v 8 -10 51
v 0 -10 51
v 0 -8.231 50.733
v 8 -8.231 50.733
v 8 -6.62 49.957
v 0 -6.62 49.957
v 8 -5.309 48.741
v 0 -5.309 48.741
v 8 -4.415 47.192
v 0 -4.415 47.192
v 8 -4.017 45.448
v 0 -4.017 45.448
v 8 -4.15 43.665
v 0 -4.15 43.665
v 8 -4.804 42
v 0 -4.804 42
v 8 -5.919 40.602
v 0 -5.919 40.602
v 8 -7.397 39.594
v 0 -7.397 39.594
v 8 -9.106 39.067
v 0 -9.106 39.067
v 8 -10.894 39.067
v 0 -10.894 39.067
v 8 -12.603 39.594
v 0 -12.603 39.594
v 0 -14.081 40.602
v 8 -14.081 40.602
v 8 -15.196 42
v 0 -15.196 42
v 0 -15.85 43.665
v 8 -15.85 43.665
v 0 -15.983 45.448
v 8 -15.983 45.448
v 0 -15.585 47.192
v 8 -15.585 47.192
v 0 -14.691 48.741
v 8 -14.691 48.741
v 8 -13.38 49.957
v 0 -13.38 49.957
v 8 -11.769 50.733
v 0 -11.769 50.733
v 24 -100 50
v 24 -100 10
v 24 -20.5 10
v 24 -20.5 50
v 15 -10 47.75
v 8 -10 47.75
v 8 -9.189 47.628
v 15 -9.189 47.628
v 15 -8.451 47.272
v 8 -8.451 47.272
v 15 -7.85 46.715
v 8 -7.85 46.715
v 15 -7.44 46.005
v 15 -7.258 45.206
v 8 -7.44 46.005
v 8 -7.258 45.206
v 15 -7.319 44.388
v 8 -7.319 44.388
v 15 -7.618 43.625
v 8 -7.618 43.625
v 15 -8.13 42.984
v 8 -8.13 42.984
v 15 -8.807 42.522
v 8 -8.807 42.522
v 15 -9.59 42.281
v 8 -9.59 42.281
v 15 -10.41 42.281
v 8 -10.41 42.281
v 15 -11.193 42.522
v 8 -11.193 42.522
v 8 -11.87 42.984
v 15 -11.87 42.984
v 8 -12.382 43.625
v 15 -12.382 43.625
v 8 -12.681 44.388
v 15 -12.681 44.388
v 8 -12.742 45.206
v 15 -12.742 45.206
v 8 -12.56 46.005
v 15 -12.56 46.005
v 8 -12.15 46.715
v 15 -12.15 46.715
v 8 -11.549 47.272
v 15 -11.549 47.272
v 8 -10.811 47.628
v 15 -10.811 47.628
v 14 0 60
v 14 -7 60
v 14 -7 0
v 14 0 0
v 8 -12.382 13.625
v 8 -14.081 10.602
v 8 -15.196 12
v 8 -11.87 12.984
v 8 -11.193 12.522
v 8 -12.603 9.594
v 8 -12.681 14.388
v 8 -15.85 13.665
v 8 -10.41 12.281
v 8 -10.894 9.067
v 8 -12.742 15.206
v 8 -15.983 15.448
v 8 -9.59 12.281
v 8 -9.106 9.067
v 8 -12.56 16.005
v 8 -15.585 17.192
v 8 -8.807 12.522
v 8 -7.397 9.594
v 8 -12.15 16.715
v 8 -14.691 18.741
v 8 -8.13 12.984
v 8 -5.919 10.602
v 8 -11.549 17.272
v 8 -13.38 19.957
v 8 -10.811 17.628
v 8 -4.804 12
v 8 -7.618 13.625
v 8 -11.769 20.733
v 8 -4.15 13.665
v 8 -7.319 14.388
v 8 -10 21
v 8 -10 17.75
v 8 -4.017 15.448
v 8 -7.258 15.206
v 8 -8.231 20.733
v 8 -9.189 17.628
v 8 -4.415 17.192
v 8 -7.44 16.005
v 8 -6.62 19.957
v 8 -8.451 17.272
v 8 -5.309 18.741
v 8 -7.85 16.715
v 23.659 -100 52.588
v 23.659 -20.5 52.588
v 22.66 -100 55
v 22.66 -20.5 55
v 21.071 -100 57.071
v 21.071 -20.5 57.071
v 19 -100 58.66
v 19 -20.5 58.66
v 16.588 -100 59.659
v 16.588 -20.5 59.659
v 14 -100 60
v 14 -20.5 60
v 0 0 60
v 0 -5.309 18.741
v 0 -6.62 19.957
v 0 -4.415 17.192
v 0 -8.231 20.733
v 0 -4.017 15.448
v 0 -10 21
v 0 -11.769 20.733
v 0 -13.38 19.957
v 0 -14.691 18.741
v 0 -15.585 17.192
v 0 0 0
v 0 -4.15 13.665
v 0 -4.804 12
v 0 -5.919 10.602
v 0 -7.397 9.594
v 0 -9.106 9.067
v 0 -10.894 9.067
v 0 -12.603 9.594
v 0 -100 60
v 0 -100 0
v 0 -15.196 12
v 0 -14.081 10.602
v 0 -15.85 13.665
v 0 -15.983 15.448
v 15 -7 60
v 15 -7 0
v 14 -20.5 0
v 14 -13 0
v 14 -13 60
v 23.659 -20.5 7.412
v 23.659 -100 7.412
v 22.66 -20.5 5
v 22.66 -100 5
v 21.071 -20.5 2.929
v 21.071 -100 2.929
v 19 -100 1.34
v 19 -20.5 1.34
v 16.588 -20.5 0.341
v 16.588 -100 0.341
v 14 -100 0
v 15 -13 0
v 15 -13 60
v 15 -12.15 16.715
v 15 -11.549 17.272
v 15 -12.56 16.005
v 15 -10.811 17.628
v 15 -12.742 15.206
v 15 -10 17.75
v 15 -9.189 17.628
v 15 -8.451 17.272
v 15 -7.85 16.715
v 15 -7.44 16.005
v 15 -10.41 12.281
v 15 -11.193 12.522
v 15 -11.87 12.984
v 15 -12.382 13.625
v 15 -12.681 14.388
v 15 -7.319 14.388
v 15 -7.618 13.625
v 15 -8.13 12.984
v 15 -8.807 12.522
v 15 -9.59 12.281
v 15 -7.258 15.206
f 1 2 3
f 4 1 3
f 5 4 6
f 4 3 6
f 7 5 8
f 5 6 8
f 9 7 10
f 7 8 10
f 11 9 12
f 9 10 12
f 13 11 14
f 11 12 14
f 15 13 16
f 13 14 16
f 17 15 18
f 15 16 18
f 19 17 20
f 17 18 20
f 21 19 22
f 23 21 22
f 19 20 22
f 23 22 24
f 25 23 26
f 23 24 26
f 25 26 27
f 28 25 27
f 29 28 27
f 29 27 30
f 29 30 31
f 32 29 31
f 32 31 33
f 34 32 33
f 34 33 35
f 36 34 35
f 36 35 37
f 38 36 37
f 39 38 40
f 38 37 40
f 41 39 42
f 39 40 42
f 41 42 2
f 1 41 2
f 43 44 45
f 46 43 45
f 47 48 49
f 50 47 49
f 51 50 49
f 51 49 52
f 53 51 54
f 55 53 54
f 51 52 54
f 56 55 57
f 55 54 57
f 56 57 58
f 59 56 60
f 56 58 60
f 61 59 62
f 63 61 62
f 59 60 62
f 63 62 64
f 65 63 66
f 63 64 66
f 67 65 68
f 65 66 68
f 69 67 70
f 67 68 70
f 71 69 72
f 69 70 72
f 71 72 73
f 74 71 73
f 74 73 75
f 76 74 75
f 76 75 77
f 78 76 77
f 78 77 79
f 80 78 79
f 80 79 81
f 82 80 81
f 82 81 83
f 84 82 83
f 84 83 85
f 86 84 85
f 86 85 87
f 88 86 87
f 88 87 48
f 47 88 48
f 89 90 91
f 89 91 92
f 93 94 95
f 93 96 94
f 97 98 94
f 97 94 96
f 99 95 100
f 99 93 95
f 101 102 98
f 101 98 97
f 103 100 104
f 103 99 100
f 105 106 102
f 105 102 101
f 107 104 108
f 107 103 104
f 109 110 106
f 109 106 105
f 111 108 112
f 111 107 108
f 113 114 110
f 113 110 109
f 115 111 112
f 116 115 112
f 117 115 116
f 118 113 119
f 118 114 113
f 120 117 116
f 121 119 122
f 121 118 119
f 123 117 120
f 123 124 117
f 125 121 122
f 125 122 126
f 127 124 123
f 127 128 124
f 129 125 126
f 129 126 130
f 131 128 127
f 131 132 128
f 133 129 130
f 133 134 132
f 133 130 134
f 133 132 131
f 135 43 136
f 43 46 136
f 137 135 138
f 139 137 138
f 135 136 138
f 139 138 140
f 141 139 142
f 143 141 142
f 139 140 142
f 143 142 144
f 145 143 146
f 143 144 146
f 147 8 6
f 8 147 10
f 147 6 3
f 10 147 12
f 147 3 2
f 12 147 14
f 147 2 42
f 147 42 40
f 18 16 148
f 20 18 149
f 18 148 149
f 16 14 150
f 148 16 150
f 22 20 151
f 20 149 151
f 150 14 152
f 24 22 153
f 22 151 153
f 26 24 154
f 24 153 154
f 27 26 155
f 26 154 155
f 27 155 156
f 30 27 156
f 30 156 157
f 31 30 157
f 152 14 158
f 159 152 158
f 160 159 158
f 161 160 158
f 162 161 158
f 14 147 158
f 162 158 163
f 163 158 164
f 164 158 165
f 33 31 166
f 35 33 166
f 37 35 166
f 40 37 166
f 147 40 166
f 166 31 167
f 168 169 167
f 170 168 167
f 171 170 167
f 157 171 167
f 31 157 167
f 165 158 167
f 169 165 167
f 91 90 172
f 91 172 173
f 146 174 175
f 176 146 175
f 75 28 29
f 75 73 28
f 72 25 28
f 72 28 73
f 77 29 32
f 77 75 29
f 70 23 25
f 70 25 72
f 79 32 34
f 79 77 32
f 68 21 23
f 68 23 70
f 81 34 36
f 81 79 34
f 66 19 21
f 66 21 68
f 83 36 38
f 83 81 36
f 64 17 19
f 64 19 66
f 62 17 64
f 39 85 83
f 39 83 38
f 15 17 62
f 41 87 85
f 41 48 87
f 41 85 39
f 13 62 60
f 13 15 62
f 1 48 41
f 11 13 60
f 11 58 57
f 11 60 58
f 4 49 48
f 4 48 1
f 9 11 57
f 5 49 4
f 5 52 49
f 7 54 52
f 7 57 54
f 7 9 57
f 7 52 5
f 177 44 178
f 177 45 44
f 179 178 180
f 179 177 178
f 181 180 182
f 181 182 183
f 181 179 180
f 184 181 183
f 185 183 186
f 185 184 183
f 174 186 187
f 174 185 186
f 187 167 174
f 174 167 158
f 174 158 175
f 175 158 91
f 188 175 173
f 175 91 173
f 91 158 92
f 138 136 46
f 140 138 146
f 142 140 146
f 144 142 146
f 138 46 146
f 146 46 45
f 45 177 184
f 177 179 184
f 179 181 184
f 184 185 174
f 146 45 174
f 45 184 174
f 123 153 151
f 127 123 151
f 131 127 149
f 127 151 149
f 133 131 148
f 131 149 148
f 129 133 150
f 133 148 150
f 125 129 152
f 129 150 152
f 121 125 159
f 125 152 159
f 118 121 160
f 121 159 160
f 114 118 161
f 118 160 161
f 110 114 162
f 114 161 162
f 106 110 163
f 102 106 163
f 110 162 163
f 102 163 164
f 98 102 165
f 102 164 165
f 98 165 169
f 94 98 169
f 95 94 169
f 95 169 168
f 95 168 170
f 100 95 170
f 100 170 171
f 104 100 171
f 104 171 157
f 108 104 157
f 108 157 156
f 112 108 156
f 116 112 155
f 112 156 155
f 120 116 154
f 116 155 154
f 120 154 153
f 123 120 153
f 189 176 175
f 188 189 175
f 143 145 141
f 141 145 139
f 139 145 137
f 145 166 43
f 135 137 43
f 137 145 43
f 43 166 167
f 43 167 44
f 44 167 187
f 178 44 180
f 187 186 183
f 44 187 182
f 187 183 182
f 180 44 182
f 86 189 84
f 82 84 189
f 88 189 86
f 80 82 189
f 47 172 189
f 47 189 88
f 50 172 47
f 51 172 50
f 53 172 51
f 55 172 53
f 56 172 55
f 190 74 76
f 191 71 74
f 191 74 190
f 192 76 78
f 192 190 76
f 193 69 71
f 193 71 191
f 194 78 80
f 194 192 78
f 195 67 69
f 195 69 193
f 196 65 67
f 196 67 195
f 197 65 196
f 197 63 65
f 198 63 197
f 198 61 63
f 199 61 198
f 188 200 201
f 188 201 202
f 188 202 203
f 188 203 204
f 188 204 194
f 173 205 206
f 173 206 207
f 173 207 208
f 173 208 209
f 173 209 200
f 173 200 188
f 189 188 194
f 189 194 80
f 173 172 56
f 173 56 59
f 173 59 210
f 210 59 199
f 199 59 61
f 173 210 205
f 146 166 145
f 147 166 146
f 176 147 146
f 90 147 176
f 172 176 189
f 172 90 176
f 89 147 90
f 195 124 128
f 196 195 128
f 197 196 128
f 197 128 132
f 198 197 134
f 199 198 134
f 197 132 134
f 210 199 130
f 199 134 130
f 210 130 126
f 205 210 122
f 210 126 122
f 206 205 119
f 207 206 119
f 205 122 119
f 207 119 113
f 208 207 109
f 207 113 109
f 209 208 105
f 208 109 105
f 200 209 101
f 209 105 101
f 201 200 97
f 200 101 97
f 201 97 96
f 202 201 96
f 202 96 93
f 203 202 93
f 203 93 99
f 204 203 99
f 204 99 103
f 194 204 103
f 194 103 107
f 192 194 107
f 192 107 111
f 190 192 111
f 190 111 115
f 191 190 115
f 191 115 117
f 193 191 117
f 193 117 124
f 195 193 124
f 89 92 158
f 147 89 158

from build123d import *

# Parameters (mm, degrees)
SALIENTE_EXTRUIR1_DEPTH = 60
CROQUIS4_W              = 60
CROQUIS4_H              = 6
SALIENTE_EXTRUIR3_DEPTH = 1
CROQUIS5_R              = 2.75
CORTAR_EXTRUIR1_DEPTH   = 25
CROQUIS6_R              = 6
CORTAR_EXTRUIR2_DEPTH   = 8
REDONDEO1_R             = 10


with BuildPart() as part:
    # Croquis1 → Saliente-Extruir1 (new body)
    with BuildSketch(Plane.XY):
        Polygon((24, -100), (24, -20.5), (14, -20.5), (14, 0), (0, 0), (0, -100), align=None)
    extrude(amount=SALIENTE_EXTRUIR1_DEPTH)

    # Croquis4 → Saliente-Extruir3 (add)
    with BuildSketch(Plane(origin=(14, 0, 0), x_dir=(0, 0, -1), z_dir=(1, 0, 0))):
        with Locations((-30, -10)):
            Rectangle(CROQUIS4_W, CROQUIS4_H)
    extrude(amount=SALIENTE_EXTRUIR3_DEPTH)

    # Croquis5 → Cortar-Extruir1 (cut, through all)
    with BuildSketch(Plane.ZY):
        with Locations((15, -10)):
            Circle(CROQUIS5_R)
        with Locations((45, -10)):
            Circle(CROQUIS5_R)
    extrude(amount=-CORTAR_EXTRUIR1_DEPTH, mode=Mode.SUBTRACT)

    # Croquis6 → Cortar-Extruir2 (cut)
    with BuildSketch(Plane.ZY):
        with Locations((15, -10)):
            Circle(CROQUIS6_R)
        with Locations((45, -10)):
            Circle(CROQUIS6_R)
    extrude(amount=-CORTAR_EXTRUIR2_DEPTH, mode=Mode.SUBTRACT)

    # Redondeo1
    redondeo1_edges = [part.edges().sort_by_distance(p)[0] for p in [
        (24, -60.25, 0),
        (24, -60.25, 60),
    ]]
    fillet(redondeo1_edges, radius=REDONDEO1_R)


solid = part.part
